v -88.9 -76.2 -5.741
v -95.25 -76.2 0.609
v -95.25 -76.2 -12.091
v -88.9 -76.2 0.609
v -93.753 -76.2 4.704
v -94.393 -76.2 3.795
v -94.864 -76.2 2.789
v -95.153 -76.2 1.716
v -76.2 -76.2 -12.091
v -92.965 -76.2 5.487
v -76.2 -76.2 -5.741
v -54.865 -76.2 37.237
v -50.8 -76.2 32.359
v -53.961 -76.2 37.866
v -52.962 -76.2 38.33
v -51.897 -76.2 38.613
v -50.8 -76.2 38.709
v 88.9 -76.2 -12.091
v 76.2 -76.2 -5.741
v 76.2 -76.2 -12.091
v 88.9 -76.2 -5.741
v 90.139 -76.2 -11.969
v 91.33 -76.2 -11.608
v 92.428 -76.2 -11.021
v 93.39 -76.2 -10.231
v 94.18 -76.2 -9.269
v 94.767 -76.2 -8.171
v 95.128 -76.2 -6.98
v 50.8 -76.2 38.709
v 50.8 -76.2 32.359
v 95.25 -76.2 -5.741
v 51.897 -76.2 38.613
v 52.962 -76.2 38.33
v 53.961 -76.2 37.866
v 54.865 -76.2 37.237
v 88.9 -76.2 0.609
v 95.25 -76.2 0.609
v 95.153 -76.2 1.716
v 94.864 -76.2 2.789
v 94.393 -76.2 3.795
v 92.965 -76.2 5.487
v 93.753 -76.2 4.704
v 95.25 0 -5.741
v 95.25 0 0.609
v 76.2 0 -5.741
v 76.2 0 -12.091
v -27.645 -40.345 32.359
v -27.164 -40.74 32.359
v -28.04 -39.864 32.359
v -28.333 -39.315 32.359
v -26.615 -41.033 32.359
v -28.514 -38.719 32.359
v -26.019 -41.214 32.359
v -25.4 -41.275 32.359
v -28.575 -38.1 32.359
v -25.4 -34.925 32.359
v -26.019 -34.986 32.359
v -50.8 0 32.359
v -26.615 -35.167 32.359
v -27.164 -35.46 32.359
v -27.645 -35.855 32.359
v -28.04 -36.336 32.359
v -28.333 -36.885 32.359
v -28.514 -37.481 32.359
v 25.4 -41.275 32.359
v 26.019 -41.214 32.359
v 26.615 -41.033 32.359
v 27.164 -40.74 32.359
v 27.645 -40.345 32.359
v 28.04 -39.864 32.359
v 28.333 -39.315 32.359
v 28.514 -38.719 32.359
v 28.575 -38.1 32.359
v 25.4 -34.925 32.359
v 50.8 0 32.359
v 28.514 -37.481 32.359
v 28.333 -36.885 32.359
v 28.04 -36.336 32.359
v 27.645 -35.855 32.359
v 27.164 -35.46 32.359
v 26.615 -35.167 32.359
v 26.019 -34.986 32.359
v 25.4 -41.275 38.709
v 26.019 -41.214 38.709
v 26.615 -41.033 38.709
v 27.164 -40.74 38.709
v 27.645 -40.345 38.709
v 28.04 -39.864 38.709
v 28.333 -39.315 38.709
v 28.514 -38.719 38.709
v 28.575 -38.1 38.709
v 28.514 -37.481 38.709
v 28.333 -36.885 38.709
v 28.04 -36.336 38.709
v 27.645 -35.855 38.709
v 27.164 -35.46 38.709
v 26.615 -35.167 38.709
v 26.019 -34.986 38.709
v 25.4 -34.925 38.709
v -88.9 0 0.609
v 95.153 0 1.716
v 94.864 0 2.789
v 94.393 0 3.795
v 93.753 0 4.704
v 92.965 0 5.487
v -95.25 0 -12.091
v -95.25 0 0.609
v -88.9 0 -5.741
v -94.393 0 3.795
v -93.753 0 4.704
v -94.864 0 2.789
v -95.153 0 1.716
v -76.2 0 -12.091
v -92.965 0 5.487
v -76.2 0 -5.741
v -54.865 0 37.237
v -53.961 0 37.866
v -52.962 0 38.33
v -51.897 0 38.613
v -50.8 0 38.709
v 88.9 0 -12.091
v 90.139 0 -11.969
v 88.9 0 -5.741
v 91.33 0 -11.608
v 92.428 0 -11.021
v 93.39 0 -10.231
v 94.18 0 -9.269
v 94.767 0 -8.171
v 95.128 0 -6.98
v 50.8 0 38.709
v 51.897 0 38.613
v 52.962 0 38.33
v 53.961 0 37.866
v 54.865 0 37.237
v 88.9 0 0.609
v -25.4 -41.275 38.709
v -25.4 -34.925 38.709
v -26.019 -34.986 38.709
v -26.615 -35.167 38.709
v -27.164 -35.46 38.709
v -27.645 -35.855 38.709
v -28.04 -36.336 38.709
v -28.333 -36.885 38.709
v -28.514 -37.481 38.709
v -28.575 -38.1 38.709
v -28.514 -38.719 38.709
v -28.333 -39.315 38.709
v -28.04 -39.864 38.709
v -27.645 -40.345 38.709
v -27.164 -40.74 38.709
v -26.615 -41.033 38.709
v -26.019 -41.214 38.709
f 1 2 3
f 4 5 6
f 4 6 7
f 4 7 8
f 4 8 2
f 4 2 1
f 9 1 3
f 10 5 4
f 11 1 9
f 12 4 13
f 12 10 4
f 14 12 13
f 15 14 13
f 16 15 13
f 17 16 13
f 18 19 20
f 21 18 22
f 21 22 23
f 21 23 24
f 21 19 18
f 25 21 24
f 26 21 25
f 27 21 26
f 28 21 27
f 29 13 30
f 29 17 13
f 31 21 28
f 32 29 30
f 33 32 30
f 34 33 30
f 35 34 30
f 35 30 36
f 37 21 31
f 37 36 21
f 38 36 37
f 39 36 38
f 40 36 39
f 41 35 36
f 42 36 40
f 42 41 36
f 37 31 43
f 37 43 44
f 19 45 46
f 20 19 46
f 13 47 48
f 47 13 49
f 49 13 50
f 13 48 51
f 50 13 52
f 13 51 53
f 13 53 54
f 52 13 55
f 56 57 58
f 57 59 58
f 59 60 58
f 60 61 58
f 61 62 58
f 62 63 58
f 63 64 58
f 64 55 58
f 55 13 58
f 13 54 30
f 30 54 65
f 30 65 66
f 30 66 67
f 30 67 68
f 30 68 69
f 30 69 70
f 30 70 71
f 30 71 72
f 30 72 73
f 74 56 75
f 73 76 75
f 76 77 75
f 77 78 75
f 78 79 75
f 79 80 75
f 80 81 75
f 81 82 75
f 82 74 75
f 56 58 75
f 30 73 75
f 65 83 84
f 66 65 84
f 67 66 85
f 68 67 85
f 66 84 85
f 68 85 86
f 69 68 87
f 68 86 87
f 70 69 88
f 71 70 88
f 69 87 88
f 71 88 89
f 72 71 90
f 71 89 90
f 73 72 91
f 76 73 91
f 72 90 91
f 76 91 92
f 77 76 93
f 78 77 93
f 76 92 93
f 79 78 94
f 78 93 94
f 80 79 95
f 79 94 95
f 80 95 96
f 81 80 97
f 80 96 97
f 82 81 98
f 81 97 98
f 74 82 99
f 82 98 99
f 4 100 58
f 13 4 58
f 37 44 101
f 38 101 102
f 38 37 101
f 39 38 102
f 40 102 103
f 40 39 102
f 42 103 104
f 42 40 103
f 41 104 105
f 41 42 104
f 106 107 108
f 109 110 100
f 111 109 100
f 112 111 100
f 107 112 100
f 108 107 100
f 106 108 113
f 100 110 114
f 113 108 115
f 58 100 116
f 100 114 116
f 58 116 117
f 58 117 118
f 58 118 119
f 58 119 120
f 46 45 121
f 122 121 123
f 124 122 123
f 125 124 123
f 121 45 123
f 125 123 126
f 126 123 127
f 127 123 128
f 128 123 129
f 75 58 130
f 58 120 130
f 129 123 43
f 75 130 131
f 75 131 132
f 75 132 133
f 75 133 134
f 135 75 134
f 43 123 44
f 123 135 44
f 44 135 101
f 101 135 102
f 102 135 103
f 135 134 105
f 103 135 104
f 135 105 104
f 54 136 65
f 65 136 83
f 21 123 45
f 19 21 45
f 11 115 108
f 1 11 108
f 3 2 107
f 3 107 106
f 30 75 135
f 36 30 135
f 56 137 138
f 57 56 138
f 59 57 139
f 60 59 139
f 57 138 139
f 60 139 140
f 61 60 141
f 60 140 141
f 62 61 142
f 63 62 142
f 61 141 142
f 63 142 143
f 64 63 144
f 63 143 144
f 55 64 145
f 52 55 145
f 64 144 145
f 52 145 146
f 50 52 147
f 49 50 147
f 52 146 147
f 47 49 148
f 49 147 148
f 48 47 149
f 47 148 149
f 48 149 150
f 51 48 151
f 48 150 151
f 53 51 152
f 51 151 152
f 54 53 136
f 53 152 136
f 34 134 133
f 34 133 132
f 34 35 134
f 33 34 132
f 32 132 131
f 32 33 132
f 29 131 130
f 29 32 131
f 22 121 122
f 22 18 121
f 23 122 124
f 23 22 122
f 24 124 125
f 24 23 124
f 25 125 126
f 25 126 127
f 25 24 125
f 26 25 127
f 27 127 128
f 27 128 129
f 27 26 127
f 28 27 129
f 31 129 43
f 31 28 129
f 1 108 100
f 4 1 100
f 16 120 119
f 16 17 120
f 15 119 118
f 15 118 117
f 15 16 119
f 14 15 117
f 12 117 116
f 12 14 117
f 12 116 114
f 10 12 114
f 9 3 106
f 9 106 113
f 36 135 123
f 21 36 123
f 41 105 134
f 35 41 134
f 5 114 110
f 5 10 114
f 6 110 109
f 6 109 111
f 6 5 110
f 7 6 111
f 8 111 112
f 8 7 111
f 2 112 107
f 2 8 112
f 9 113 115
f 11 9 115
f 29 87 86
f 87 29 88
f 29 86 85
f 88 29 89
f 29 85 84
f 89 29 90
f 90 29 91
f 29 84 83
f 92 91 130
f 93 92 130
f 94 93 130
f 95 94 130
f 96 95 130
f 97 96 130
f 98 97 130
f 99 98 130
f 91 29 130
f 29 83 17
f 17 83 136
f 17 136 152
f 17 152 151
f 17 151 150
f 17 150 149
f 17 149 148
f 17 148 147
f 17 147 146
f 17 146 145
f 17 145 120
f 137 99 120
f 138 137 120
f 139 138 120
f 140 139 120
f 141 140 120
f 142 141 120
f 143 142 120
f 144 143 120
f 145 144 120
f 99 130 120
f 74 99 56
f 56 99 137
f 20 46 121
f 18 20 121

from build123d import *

# Parameters (mm, degrees)
F1_DEPTH = 76.2
F2_R     = 6.35
F4_DEPTH = 50.801


with BuildPart() as f1:
    # F0 (on Front) → F1 (new body)
    with BuildSketch(Plane.XZ):
        Polygon((88.9, -5.741036), (76.2, -5.741036), (76.2, -12.091036), (95.25, -12.091036), (95.25, 3.583144), (53.099017, 38.708964), (-53.099017, 38.708964), (-95.25, 3.583144), (-95.25, -12.091036), (-76.2, -12.091036), (-76.2, -5.741036), (-88.9, -5.741036), (-88.9, 0.608964), (-50.8, 32.358964), (50.8, 32.358964), (88.9, 0.608964), align=None)
    extrude(amount=F1_DEPTH)

    # F2
    f2_edges = [f1.edges().sort_by_distance(p)[0] for p in [
        (-53.099017, -38.1, 38.708964),
        (53.099017, -38.1, 38.708964),
        (95.25, -38.1, 3.583144),
        (95.25, -38.1, -12.091036),
        (-95.25, -38.1, 3.583144),
    ]]
    fillet(f2_edges, radius=F2_R)

    # F3 (on face) → F4 (cut, through all)
    with BuildSketch(Plane.XY.offset(38.708964)):
        with BuildLine():
            Line((25.4, -34.925), (-25.4, -34.925))
            ThreePointArc((-25.4, -34.925), (-28.575, -38.1), (-25.4, -41.275))
            Line((-25.4, -41.275), (25.4, -41.275))
            ThreePointArc((25.4, -41.275), (28.575, -38.1), (25.4, -34.925))
        make_face()
    extrude(amount=-F4_DEPTH, mode=Mode.SUBTRACT)


solid = f1.part
